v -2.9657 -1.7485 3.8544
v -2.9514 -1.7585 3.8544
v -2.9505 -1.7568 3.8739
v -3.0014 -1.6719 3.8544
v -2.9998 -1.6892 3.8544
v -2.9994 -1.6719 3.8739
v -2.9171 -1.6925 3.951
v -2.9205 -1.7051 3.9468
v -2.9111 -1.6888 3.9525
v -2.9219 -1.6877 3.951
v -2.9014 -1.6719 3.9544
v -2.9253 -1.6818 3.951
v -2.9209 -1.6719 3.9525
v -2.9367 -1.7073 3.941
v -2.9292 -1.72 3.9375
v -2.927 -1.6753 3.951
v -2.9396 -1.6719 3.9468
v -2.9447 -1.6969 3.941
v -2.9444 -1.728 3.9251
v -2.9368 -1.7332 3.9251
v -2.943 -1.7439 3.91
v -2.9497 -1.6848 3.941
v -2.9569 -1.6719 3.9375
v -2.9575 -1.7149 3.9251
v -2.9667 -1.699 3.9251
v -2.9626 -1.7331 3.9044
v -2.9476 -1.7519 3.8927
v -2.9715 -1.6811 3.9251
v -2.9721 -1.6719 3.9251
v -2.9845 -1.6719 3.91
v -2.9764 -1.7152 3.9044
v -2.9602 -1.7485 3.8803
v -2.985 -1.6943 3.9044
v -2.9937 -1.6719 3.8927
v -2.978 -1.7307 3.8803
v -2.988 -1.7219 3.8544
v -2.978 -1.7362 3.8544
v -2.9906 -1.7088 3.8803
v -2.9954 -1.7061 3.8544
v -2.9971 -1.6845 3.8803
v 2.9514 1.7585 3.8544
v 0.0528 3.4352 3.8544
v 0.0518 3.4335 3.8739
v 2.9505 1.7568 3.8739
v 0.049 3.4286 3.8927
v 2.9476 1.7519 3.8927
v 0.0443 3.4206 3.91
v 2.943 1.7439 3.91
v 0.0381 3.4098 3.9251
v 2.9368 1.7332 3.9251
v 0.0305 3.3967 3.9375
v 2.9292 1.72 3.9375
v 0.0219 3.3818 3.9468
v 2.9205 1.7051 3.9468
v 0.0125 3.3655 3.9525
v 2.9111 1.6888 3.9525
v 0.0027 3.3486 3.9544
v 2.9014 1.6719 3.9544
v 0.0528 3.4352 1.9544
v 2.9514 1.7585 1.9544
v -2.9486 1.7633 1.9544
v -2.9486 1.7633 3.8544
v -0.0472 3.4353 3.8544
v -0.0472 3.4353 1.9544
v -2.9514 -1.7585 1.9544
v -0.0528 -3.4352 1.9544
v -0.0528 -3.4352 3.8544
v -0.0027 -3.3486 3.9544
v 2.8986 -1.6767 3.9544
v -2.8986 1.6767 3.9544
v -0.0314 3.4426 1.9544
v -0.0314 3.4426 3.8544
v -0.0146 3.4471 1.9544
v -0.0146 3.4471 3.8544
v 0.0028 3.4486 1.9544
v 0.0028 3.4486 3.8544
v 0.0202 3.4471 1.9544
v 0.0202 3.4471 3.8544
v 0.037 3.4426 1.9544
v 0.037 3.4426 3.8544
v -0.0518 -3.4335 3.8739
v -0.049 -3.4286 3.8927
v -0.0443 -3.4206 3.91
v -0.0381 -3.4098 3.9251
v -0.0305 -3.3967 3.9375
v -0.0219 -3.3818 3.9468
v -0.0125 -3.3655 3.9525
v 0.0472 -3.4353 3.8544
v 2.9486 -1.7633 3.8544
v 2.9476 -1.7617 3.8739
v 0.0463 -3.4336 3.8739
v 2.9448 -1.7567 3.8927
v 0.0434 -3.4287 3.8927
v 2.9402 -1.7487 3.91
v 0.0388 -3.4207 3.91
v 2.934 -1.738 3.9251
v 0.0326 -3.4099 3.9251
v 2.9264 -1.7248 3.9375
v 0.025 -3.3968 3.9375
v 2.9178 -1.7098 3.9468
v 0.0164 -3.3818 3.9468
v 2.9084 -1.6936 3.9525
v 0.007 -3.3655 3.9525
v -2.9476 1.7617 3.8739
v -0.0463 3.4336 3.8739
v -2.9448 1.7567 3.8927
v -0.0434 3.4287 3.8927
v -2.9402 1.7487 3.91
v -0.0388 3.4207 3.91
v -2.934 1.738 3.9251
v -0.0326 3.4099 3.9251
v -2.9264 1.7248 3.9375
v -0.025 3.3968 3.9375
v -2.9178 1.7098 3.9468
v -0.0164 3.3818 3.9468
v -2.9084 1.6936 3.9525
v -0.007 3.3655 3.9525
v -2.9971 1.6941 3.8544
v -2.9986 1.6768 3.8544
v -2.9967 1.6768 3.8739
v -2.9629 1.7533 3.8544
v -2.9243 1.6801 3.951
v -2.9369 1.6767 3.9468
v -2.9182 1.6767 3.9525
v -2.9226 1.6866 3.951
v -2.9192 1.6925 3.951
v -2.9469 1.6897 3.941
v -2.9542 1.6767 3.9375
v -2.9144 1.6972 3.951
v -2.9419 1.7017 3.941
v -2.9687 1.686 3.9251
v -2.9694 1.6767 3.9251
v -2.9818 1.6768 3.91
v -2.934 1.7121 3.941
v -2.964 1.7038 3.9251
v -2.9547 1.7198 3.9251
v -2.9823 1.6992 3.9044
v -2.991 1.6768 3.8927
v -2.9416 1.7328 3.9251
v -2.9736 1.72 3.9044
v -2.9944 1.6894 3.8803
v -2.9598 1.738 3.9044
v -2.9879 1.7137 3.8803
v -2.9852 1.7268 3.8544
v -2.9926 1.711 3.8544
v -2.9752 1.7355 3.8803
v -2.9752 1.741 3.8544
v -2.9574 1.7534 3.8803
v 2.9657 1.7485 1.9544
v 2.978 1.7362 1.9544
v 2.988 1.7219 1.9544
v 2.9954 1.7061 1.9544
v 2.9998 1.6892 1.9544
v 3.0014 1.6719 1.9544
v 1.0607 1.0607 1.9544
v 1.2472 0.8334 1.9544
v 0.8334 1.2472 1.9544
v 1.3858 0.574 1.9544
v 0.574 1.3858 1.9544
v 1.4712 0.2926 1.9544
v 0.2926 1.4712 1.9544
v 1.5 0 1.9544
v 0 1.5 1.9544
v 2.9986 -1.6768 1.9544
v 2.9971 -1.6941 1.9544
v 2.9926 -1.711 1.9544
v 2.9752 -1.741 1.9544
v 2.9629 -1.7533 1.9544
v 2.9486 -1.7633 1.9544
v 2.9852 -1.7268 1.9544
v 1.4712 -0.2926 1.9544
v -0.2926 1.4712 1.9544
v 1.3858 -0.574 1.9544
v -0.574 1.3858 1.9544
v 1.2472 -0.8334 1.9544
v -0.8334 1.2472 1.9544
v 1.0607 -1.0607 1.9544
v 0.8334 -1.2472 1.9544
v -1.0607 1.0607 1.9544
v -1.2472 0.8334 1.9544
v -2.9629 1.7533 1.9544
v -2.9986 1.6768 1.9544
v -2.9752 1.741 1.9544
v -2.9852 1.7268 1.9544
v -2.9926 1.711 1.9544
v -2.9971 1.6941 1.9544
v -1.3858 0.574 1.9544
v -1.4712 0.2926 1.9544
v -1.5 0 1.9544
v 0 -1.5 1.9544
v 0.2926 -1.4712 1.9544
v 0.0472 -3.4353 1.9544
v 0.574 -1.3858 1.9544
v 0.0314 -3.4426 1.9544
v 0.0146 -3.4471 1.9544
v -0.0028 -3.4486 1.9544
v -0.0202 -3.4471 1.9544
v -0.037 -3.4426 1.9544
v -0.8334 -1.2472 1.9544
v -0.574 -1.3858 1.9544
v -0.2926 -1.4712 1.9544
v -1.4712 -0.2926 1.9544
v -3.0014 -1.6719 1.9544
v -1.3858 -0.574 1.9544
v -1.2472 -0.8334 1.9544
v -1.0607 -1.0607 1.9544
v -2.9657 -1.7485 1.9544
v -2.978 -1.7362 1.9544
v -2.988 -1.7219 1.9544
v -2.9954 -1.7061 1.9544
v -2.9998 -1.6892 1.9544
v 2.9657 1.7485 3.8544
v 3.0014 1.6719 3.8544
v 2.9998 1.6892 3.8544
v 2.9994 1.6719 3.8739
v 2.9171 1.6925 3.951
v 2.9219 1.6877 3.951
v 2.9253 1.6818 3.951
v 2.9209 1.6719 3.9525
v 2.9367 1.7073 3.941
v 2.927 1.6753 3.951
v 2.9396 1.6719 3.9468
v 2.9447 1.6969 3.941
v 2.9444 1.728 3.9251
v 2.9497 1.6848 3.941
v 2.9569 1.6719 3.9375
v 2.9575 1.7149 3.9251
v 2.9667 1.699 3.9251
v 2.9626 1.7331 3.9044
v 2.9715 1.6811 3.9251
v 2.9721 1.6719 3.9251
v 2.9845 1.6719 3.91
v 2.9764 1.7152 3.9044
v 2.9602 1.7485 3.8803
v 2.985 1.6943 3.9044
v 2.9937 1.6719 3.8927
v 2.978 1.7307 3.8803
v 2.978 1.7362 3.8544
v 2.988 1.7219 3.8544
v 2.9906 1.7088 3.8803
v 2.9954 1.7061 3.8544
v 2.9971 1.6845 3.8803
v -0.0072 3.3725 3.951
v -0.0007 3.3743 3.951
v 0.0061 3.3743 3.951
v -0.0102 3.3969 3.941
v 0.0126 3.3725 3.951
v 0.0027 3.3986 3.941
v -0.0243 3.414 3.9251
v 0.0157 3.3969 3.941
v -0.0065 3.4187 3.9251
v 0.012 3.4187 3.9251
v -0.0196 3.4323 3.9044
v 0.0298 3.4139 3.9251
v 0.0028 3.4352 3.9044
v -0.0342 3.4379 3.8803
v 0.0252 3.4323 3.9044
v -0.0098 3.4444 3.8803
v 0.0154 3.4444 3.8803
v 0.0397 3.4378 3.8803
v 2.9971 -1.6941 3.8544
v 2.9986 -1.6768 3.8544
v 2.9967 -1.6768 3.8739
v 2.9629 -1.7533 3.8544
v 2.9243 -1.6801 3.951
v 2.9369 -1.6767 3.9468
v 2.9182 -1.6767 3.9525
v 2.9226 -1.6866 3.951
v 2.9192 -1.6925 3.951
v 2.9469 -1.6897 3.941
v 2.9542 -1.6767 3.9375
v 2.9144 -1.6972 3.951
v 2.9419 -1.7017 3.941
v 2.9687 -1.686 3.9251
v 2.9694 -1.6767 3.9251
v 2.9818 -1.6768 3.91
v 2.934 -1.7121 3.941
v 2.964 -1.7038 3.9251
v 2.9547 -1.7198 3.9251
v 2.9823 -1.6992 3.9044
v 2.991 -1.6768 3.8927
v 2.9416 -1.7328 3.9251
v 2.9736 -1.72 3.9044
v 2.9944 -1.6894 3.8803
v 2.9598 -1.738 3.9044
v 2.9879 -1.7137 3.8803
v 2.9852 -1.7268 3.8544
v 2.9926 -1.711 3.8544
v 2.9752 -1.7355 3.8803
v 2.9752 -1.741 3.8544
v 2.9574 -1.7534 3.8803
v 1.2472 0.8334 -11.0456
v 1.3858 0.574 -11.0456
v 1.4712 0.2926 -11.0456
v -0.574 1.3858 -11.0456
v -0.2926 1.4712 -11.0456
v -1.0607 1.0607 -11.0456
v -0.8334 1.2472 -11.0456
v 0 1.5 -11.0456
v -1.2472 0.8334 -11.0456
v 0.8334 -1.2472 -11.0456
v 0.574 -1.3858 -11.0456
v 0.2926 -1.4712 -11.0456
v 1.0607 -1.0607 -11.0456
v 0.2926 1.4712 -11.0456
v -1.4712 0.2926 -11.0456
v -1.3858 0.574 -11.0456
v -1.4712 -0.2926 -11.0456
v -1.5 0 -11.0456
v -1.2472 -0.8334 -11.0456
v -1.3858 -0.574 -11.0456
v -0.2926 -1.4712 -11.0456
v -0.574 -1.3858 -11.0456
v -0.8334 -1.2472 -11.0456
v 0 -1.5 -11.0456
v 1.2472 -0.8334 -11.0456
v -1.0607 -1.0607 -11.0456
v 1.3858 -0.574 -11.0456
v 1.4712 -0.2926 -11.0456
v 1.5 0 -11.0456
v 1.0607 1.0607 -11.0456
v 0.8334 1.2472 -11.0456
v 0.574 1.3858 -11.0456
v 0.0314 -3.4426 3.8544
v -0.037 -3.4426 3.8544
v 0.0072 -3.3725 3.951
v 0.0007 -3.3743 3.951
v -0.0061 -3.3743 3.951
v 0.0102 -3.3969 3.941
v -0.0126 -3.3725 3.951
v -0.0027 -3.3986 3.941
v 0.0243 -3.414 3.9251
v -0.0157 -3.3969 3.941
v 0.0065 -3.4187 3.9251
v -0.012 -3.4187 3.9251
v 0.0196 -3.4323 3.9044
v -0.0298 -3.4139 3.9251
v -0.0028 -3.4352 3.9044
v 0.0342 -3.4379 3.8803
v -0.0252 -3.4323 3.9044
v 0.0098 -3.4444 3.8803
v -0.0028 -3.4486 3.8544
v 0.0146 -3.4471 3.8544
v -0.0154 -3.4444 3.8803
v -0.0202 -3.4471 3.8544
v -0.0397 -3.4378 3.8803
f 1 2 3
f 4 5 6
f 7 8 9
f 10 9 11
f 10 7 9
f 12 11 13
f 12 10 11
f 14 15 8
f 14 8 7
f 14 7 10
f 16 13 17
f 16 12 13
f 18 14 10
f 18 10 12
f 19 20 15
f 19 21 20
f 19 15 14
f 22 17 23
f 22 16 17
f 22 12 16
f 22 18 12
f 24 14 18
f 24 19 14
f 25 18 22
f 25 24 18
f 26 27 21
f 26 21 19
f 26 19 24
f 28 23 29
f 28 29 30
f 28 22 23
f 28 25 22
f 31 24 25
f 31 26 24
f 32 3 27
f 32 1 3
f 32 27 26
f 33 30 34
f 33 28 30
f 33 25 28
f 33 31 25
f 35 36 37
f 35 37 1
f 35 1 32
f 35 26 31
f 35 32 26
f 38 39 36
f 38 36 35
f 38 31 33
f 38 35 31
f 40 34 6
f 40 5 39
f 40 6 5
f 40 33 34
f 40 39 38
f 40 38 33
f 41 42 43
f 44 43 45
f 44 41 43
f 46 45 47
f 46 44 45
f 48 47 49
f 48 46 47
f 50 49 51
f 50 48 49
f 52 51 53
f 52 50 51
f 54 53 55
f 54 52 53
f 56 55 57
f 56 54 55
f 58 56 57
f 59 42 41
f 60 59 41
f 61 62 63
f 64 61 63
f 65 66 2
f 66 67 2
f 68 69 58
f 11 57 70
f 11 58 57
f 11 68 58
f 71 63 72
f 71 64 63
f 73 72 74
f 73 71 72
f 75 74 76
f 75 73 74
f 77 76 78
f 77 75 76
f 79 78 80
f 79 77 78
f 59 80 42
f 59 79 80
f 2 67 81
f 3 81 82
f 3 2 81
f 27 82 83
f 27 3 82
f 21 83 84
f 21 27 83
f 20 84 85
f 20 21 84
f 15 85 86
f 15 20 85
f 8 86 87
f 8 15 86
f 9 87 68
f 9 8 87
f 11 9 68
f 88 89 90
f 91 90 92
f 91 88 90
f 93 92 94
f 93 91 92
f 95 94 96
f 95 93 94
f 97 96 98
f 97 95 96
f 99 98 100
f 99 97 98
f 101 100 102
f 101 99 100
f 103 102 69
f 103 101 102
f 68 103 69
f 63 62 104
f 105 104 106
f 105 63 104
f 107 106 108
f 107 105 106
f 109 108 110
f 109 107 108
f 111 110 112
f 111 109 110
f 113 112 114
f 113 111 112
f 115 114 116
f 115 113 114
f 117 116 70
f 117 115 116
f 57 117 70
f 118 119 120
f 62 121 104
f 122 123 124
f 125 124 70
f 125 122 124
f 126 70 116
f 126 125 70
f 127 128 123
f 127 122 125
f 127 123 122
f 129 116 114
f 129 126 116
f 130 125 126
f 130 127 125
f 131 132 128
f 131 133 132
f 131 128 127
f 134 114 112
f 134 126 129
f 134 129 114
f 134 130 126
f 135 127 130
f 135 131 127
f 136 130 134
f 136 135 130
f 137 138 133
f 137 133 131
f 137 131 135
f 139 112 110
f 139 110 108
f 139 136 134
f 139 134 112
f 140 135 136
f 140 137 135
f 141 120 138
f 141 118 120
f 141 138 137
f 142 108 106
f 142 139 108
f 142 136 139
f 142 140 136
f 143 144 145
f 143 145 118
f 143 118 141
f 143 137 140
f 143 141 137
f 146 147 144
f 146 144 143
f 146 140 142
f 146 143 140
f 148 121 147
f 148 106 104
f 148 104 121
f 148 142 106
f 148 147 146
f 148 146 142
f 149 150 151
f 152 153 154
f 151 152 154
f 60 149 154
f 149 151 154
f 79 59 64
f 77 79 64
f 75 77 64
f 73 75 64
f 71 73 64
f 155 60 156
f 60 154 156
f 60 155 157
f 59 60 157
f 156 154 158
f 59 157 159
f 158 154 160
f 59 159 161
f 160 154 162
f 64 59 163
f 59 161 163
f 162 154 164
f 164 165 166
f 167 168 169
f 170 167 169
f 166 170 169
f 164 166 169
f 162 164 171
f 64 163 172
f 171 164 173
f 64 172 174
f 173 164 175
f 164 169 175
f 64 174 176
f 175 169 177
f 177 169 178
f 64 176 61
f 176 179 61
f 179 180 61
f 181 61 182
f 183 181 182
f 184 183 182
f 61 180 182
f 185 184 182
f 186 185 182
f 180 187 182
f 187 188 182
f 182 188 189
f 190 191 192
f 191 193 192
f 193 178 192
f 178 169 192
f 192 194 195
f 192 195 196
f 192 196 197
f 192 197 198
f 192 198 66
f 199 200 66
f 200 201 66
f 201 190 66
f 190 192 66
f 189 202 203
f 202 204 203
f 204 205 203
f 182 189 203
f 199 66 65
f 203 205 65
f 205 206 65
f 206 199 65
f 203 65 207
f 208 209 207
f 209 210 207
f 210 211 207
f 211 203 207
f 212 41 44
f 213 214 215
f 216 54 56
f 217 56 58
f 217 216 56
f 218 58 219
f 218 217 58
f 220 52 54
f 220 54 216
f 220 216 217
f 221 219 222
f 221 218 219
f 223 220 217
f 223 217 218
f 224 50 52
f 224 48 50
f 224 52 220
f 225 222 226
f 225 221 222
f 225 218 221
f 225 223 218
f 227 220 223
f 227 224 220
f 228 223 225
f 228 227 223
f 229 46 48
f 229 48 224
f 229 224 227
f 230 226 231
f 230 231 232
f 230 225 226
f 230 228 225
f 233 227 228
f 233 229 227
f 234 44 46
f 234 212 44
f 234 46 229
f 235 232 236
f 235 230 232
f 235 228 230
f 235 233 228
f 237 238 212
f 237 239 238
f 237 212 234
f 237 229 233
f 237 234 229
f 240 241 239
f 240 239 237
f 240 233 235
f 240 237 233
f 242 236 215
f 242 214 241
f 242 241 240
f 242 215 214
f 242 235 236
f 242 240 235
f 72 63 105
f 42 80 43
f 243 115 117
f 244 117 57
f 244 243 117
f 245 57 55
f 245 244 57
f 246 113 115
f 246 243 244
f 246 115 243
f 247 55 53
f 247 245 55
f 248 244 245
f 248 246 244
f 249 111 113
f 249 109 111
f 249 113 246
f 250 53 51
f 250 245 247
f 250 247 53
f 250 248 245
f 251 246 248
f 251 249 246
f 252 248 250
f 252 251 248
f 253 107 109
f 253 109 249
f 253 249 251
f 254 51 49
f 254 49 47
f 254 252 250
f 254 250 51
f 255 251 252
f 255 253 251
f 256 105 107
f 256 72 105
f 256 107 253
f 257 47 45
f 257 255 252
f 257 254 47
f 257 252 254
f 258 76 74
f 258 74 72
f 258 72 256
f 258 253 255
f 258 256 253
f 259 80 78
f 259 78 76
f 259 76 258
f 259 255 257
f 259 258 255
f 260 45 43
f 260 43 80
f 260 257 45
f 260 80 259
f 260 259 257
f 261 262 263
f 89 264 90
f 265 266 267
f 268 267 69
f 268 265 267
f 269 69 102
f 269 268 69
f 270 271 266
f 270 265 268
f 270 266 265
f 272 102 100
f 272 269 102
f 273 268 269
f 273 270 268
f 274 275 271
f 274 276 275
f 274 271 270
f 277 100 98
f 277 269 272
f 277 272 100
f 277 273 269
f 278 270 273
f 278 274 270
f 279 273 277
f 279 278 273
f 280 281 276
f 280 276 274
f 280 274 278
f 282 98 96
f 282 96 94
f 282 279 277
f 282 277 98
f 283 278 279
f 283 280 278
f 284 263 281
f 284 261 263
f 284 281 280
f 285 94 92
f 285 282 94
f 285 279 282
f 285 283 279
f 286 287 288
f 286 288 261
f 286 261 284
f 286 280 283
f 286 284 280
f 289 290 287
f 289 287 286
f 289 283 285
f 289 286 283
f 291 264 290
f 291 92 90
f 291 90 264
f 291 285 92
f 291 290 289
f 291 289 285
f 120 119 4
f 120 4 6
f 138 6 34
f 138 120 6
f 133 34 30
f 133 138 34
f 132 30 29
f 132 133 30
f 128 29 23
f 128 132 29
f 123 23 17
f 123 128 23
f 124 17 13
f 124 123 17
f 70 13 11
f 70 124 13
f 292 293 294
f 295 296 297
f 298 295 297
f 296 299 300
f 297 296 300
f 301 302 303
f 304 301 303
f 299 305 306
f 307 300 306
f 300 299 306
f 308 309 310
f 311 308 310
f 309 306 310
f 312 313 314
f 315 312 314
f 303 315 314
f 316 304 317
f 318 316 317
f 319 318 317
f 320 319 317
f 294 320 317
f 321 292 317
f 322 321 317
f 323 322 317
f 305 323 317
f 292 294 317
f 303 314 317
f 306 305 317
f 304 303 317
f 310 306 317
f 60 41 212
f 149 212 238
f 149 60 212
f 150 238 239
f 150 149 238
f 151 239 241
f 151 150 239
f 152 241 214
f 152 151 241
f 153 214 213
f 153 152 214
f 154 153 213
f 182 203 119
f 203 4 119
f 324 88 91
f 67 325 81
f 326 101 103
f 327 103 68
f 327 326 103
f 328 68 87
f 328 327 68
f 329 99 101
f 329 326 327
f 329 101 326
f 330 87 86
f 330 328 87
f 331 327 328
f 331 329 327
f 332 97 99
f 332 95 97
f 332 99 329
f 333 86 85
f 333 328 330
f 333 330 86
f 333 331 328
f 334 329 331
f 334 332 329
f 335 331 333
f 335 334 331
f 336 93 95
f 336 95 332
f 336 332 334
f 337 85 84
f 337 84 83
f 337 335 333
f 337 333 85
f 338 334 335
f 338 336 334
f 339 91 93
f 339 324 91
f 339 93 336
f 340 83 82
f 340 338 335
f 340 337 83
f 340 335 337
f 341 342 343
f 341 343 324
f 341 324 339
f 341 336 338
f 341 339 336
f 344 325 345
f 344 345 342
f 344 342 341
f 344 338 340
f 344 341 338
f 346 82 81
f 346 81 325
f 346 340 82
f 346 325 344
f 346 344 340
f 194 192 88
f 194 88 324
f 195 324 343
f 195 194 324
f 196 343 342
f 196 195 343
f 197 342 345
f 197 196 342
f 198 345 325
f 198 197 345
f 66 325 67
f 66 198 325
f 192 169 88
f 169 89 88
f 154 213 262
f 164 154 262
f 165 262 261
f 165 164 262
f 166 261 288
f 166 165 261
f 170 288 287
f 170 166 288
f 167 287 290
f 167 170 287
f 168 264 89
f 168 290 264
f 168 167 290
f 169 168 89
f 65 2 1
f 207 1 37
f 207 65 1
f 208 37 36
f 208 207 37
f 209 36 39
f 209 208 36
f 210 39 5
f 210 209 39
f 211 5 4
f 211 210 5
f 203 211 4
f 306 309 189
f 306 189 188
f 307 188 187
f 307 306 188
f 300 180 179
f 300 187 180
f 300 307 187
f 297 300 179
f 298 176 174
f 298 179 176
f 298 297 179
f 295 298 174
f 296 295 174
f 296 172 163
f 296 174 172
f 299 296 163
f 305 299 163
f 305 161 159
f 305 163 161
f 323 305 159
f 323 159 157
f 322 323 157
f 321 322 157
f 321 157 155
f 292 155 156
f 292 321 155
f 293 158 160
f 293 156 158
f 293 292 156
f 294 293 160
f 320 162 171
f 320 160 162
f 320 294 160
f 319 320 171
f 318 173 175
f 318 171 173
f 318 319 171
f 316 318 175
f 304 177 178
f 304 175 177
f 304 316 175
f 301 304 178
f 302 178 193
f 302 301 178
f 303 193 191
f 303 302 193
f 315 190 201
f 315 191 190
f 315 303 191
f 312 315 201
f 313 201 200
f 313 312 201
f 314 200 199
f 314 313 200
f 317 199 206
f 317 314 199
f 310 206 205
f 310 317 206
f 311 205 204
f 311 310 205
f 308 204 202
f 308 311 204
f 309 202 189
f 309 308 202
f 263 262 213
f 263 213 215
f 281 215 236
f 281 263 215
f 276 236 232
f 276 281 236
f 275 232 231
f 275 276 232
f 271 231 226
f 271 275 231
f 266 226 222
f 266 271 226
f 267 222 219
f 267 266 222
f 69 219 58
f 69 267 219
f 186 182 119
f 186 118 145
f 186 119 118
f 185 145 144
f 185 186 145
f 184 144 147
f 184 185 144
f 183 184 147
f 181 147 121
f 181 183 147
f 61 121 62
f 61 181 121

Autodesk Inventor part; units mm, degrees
ref_plane "YZ Plane" through (0, 0, 0) normal (1, 0, 0) x (0, 1, 0)
ref_plane "XZ Plane" through (0, 0, 0) normal (0, 1, 0) x (-1, 0, 0)
ref_plane "XY Plane" through (0, 0, 0) normal (0, 0, 1) x (1, 0, 0)
sketch "Sketch1" plane through (0, 0, 0) normal (0, 1, 0) x (-1, 0, 0)
  line L0 (0, 3.9544) -> (10, 3.9544)
  line L1 (1.5, 1.9544) -> (1.5, -11.0456)
  line L2 (1.5, -11.0456) -> (0, -11.0456)
  line L3 (0, -11.0456) -> (0, 3.9544)
  line L4 (10, 3.9544) -> (10, 1.9544)
  line L5 (10, 1.9544) -> (1.5, 1.9544)
  point P0 (0, 0)
  dimension "d0" = 10
  dimension "d1" = 2
  dimension "d2" = 15
  dimension "d21" = 1.5
revolve "Revolution1" add sketch "Sketch1" angle 360 about axis through (0, 0, -11.0456) along (0, 0, 1)
thread "Thread2" size "M3x0.5" class "6g" standard "ANSI Metric M Profile" full length
sketch "Sketch5" plane through (0, 0, 3.9544) normal (0, 0, 1) x (1, 0, 0)
  circle A0 centre (0, 0) radius 16.622
  line L0 (-2.9986, 1.7345) -> (0.0028, 3.4641)
  line L1 (0.0028, 3.4641) -> (3.0014, 1.7296)
  line L2 (3.0014, 1.7296) -> (2.9986, -1.7345)
  line L3 (2.9986, -1.7345) -> (-0.0028, -3.4641)
  line L4 (-0.0028, -3.4641) -> (-3.0014, -1.7296)
  line L5 (-3.0014, -1.7296) -> (-2.9986, 1.7345)
  dimension "d24" = 6
extrude "Extrusion1" cut sketch "Sketch5" against normal through all
fillet "Fillet1" radius 0.1 12 edges at (0.0028, 3.4641, 2.9544) (3.0014, 1.7296, 2.9544) (-2.9986, 1.7345, 2.9544) (2.9986, -1.7345, 2.9544) (-0.0028, -3.4641, 2.9544) (-3.0014, -1.7296, 2.9544) (1.5021, 2.5969, 3.9544) (-1.4979, 2.5993, 3.9544) (-3, 0.0024, 3.9544) (-1.5021, -2.5969, 3.9544) (1.4979, -2.5993, 3.9544) (3, -0.0024, 3.9544)
properties part number "Fi3es60mmcsavar" material "Steel, Alloy"
